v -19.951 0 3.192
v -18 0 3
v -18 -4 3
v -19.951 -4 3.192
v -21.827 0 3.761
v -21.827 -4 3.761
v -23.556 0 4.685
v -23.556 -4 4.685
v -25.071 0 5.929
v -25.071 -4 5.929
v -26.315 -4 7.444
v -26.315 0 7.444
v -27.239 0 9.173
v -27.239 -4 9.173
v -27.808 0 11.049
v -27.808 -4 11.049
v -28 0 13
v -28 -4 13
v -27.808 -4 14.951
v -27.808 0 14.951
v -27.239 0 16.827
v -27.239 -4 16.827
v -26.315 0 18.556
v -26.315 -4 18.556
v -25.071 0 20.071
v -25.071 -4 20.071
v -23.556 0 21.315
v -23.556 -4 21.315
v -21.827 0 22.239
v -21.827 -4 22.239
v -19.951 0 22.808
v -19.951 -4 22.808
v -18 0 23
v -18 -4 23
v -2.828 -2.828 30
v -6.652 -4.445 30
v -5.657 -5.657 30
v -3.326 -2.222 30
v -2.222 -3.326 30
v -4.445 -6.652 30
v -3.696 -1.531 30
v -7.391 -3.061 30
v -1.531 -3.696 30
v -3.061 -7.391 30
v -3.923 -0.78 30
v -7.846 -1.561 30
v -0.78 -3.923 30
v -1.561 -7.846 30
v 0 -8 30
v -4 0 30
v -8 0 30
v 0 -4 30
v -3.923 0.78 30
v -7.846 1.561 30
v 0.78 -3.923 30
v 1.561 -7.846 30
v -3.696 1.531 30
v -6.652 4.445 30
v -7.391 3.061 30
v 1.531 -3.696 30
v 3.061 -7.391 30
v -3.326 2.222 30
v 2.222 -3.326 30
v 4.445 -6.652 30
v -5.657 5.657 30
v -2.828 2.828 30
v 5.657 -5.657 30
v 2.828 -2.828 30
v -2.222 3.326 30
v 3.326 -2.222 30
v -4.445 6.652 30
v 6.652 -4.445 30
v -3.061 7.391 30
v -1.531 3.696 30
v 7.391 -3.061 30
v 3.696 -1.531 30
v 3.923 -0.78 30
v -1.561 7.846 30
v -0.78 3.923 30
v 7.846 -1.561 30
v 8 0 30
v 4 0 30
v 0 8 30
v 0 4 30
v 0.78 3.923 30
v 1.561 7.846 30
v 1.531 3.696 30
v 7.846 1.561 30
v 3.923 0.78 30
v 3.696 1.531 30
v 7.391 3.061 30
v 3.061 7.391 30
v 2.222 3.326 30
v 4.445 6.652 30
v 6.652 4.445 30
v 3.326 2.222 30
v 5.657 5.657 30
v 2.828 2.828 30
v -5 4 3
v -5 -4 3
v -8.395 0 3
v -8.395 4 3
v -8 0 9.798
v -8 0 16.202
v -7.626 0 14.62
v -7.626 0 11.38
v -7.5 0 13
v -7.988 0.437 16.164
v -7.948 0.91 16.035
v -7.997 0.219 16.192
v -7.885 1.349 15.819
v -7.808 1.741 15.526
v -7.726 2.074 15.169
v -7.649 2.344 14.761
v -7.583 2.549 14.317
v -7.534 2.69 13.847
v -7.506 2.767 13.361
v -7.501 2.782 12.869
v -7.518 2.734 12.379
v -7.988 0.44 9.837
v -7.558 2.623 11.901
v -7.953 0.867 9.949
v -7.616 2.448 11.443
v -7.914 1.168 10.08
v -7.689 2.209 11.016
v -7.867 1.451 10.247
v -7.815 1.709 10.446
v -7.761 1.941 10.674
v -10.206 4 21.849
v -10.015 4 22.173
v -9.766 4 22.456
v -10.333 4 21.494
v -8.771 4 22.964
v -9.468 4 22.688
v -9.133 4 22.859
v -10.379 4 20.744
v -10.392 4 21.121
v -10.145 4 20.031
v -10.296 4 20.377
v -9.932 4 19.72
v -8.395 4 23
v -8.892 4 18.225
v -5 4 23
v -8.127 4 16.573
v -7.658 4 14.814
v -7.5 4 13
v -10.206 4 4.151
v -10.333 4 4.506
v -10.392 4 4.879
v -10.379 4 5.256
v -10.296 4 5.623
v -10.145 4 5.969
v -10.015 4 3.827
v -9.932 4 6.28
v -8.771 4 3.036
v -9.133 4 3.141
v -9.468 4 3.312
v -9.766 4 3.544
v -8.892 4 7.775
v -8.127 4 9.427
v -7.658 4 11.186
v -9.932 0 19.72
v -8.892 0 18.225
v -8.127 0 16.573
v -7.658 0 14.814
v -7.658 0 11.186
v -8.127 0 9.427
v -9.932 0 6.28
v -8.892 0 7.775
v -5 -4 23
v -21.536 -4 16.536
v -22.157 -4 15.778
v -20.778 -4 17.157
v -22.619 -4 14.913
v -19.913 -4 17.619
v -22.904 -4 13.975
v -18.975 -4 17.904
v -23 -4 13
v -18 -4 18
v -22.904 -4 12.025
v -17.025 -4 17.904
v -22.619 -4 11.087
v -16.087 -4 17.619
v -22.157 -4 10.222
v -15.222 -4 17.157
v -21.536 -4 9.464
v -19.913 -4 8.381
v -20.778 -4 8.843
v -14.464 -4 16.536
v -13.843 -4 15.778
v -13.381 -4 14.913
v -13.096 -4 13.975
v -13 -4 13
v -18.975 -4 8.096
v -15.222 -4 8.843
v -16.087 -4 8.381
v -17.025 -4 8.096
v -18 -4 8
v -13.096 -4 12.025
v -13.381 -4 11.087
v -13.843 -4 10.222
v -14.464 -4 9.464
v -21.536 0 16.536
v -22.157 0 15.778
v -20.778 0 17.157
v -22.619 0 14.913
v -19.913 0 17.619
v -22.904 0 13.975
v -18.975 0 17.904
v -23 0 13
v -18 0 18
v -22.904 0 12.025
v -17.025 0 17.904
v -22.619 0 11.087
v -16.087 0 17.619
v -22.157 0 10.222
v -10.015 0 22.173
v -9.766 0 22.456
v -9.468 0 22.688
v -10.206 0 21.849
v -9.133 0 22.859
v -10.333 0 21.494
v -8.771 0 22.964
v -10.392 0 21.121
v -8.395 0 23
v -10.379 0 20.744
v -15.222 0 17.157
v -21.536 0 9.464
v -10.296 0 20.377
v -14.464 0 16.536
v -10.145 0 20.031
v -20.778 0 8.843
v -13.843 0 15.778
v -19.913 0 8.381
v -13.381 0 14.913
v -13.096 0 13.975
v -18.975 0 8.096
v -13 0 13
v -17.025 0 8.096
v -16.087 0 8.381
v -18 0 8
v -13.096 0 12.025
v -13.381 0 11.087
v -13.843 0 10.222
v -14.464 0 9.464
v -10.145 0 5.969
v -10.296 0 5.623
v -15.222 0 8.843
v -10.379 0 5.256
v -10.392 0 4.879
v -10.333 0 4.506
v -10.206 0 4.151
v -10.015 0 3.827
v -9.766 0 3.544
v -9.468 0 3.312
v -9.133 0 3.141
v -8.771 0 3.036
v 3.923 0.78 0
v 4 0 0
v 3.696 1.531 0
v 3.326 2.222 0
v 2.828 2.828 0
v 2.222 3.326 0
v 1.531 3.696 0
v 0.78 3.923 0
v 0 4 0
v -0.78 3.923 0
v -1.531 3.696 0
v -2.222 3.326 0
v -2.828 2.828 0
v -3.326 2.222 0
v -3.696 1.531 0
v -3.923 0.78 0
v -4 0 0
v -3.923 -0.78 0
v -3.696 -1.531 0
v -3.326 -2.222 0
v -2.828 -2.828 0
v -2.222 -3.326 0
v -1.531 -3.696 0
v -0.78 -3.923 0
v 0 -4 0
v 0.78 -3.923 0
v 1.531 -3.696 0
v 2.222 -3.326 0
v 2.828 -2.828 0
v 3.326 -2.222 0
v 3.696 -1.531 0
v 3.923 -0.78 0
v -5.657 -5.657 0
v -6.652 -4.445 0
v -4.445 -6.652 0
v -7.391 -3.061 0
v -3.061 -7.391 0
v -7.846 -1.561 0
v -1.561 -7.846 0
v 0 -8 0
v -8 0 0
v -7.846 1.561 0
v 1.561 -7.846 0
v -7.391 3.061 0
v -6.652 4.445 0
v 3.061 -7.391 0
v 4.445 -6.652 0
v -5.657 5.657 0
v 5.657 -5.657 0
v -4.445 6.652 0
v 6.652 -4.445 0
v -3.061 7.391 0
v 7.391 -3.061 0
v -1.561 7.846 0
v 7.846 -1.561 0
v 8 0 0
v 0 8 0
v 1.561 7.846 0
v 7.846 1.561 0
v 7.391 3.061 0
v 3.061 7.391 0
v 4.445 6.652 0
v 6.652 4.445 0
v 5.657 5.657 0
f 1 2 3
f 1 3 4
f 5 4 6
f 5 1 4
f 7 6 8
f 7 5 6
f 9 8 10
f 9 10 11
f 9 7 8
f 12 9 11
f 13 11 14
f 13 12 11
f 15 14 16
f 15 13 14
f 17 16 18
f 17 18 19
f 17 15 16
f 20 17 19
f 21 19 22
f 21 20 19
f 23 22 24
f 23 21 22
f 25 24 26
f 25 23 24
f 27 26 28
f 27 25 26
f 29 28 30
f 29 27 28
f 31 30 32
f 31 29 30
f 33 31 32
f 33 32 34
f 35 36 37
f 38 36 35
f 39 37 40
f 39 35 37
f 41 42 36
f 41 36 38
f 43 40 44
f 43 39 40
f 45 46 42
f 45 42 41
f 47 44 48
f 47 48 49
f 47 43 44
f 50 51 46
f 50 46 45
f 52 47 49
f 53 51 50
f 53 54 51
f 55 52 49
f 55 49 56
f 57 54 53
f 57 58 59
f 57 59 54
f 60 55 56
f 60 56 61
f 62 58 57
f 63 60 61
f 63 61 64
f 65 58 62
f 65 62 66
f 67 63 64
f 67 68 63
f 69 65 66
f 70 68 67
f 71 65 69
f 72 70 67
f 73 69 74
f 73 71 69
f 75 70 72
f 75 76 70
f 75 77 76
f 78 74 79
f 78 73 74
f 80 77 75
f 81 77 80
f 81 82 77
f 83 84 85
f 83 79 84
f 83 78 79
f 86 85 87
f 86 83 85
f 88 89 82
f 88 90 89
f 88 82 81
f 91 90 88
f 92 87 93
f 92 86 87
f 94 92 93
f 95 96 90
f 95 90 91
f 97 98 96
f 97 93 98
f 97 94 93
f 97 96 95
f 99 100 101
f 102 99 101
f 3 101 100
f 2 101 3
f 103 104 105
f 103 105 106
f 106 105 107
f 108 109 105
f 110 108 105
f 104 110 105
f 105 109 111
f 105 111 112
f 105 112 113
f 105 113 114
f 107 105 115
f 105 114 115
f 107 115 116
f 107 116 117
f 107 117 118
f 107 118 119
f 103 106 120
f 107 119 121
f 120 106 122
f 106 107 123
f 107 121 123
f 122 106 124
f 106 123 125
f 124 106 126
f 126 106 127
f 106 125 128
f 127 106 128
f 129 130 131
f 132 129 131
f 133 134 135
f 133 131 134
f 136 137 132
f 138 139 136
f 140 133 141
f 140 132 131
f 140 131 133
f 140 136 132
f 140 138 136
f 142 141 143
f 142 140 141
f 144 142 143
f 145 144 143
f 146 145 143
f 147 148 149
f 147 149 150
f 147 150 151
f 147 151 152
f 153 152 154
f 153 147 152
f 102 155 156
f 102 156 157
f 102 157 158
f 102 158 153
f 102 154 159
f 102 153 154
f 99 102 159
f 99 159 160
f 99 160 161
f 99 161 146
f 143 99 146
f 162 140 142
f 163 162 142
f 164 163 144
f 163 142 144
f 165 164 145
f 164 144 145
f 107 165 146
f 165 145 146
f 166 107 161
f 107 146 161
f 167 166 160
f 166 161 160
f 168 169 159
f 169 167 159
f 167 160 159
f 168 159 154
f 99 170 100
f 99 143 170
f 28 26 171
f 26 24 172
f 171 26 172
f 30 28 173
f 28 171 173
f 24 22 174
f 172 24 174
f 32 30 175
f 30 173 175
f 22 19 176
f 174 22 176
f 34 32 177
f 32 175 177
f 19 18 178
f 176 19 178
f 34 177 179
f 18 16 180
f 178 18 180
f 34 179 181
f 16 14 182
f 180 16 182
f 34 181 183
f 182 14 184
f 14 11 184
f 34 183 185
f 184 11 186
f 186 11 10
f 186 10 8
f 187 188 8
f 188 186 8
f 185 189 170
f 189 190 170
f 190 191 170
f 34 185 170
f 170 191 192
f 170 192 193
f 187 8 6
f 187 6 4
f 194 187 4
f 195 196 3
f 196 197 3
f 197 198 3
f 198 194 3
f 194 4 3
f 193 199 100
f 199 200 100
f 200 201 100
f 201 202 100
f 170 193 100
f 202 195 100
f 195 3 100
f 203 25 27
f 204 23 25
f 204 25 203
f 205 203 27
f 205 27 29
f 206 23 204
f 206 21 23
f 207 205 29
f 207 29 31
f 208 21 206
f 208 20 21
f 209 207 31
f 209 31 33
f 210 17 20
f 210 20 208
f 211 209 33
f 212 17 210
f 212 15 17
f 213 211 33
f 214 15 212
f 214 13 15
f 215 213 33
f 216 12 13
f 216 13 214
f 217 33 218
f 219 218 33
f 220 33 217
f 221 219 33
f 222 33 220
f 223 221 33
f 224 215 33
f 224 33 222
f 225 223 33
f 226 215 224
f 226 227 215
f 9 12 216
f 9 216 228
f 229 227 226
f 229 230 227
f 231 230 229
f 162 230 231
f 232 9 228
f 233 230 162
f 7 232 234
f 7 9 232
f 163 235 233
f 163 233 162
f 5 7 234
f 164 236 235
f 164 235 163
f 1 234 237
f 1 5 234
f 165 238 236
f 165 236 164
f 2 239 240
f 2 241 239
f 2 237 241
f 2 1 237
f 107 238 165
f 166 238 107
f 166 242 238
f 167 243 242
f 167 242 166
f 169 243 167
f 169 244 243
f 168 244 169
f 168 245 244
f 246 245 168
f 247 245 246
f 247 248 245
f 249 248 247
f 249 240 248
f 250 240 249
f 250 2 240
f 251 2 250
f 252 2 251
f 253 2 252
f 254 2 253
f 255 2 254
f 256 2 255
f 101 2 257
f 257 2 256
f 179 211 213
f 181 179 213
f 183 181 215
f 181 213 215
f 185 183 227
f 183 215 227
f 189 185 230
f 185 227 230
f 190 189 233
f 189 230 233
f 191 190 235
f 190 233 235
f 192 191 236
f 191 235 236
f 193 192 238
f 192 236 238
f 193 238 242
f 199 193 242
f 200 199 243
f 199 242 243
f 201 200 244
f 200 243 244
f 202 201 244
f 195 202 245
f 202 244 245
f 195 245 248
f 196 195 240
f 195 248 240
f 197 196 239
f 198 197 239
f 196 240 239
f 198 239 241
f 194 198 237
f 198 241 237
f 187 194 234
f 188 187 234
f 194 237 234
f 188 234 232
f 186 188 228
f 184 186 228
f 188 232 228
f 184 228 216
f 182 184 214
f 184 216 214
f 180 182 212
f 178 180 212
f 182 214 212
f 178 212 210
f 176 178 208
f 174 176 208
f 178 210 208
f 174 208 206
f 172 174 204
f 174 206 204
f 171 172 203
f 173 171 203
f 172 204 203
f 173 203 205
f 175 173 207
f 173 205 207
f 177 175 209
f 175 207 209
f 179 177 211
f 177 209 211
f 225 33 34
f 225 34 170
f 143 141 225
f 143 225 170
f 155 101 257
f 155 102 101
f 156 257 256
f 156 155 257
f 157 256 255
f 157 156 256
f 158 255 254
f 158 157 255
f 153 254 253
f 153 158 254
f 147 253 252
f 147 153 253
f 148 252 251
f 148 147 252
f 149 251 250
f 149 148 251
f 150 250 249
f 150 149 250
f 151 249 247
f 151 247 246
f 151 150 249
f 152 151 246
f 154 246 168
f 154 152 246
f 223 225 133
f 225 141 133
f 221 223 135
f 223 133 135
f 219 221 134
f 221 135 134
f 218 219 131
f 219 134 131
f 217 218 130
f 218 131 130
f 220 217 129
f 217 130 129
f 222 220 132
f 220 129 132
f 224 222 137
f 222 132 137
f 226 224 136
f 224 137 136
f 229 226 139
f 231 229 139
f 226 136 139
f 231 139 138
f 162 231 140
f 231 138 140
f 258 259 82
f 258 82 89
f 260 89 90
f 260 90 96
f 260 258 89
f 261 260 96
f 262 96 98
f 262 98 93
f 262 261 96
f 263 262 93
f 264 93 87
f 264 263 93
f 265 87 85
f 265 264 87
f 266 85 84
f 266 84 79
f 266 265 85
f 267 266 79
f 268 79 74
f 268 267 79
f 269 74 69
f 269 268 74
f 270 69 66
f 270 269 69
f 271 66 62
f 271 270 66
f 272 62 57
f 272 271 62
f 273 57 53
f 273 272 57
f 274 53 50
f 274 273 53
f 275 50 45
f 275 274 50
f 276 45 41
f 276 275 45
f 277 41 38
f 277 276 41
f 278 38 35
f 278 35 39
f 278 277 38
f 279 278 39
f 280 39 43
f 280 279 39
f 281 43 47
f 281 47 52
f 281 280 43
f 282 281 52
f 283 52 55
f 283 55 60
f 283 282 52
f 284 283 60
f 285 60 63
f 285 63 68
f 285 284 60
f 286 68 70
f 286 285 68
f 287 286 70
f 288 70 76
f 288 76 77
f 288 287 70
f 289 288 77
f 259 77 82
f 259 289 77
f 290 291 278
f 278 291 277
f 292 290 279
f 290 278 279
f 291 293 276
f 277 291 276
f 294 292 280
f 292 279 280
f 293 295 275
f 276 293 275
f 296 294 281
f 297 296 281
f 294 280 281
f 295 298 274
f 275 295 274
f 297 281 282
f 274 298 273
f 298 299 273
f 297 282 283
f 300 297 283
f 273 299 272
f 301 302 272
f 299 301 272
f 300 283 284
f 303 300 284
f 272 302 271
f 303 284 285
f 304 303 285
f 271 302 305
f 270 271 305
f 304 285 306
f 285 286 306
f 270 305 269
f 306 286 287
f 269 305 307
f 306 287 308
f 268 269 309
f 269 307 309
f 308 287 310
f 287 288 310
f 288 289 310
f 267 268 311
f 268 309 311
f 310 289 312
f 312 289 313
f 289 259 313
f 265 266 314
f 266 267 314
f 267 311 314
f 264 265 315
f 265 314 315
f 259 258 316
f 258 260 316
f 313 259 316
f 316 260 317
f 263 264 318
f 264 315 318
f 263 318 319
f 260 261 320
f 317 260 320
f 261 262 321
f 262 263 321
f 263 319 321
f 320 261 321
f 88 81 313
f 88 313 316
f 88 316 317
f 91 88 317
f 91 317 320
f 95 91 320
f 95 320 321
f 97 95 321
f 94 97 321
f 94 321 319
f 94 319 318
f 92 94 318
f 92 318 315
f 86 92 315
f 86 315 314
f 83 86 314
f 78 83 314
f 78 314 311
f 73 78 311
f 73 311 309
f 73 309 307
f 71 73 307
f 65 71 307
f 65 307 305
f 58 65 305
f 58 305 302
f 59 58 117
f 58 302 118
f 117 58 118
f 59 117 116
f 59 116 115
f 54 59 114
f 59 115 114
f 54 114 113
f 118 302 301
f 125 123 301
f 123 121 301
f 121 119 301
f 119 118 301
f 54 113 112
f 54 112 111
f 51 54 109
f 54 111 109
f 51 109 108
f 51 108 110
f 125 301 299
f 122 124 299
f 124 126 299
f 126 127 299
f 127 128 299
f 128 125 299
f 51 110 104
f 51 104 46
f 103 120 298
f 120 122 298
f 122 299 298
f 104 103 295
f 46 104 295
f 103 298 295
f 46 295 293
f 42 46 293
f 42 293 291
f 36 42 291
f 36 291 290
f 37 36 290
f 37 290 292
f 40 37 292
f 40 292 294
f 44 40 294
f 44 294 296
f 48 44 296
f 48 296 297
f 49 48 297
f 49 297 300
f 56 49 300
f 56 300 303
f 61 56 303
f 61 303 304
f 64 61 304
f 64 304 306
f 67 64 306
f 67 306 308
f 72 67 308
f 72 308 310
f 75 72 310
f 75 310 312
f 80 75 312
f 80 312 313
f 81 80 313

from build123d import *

# Parameters (mm, degrees)
SKETCH1_R           = 8
SKETCH1_R_2         = 4
BOSS_EXTRUDE1_DEPTH = 30
BOSS_EXTRUDE2_DEPTH = 4
SKETCH3_R           = 10.5
CUT_EXTRUDE1_DEPTH  = 4
FILLET1_R           = 2
SKETCH4_R           = 5
CUT_EXTRUDE2_DEPTH  = 4


with BuildPart() as part:
    # Sketch1 → Boss-Extrude1 (new body)
    with BuildSketch(Plane.XY):
        Circle(SKETCH1_R)
        Circle(SKETCH1_R_2, mode=Mode.SUBTRACT)
    extrude(amount=BOSS_EXTRUDE1_DEPTH)


with BuildPart() as body_2:
    # Sketch2 → Boss-Extrude2 (new, symmetric)
    with BuildSketch(Plane(origin=(0, 0, 0), x_dir=(1, 0, 0), z_dir=(0, 1, 0))):
        with BuildLine():
            Line((-5, -3), (-18, -3))
            ThreePointArc((-18, -3), (-28, -13), (-18, -23))
            Line((-18, -23), (-5, -23))
            Line((-5, -23), (-5, -3))
        make_face()
    extrude(amount=BOSS_EXTRUDE2_DEPTH, both=True)


with BuildPart() as cut_extrude1_tool:
    # Sketch3 → Cut-Extrude1 (new body)
    with BuildSketch(Plane(origin=(0, 4, 0), x_dir=(1, 0, 0), z_dir=(0, 1, 0))):
        with Locations((-18, -13)):
            Circle(SKETCH3_R)
    extrude(amount=-CUT_EXTRUDE1_DEPTH)


with BuildPart() as part_1:
    add(part.part)

    # Cut-Extrude1: cut by cut_extrude1_tool
    add(cut_extrude1_tool.part, mode=Mode.SUBTRACT)


with BuildPart() as body_2_1:
    add(body_2.part)

    # Cut-Extrude1: cut by cut_extrude1_tool
    add(cut_extrude1_tool.part, mode=Mode.SUBTRACT)

    # Fillet1
    fillet1_edges = [body_2_1.edges().sort_by_distance(p)[0] for p in [
        (-14.798437881, 2, 23),
        (-14.798437881, 2, 3),
    ]]
    fillet(fillet1_edges, radius=FILLET1_R)

    # Sketch4 → Cut-Extrude2 (cut)
    with BuildSketch(Plane(origin=(0, 0, 0), x_dir=(1, 0, 0), z_dir=(0, 1, 0))):
        with Locations(Location((-18, -13, 0), (0, 0, 270))):
            Circle(SKETCH4_R)
    extrude(amount=-CUT_EXTRUDE2_DEPTH, mode=Mode.SUBTRACT)


solid = Compound([part_1.part, body_2_1.part])
